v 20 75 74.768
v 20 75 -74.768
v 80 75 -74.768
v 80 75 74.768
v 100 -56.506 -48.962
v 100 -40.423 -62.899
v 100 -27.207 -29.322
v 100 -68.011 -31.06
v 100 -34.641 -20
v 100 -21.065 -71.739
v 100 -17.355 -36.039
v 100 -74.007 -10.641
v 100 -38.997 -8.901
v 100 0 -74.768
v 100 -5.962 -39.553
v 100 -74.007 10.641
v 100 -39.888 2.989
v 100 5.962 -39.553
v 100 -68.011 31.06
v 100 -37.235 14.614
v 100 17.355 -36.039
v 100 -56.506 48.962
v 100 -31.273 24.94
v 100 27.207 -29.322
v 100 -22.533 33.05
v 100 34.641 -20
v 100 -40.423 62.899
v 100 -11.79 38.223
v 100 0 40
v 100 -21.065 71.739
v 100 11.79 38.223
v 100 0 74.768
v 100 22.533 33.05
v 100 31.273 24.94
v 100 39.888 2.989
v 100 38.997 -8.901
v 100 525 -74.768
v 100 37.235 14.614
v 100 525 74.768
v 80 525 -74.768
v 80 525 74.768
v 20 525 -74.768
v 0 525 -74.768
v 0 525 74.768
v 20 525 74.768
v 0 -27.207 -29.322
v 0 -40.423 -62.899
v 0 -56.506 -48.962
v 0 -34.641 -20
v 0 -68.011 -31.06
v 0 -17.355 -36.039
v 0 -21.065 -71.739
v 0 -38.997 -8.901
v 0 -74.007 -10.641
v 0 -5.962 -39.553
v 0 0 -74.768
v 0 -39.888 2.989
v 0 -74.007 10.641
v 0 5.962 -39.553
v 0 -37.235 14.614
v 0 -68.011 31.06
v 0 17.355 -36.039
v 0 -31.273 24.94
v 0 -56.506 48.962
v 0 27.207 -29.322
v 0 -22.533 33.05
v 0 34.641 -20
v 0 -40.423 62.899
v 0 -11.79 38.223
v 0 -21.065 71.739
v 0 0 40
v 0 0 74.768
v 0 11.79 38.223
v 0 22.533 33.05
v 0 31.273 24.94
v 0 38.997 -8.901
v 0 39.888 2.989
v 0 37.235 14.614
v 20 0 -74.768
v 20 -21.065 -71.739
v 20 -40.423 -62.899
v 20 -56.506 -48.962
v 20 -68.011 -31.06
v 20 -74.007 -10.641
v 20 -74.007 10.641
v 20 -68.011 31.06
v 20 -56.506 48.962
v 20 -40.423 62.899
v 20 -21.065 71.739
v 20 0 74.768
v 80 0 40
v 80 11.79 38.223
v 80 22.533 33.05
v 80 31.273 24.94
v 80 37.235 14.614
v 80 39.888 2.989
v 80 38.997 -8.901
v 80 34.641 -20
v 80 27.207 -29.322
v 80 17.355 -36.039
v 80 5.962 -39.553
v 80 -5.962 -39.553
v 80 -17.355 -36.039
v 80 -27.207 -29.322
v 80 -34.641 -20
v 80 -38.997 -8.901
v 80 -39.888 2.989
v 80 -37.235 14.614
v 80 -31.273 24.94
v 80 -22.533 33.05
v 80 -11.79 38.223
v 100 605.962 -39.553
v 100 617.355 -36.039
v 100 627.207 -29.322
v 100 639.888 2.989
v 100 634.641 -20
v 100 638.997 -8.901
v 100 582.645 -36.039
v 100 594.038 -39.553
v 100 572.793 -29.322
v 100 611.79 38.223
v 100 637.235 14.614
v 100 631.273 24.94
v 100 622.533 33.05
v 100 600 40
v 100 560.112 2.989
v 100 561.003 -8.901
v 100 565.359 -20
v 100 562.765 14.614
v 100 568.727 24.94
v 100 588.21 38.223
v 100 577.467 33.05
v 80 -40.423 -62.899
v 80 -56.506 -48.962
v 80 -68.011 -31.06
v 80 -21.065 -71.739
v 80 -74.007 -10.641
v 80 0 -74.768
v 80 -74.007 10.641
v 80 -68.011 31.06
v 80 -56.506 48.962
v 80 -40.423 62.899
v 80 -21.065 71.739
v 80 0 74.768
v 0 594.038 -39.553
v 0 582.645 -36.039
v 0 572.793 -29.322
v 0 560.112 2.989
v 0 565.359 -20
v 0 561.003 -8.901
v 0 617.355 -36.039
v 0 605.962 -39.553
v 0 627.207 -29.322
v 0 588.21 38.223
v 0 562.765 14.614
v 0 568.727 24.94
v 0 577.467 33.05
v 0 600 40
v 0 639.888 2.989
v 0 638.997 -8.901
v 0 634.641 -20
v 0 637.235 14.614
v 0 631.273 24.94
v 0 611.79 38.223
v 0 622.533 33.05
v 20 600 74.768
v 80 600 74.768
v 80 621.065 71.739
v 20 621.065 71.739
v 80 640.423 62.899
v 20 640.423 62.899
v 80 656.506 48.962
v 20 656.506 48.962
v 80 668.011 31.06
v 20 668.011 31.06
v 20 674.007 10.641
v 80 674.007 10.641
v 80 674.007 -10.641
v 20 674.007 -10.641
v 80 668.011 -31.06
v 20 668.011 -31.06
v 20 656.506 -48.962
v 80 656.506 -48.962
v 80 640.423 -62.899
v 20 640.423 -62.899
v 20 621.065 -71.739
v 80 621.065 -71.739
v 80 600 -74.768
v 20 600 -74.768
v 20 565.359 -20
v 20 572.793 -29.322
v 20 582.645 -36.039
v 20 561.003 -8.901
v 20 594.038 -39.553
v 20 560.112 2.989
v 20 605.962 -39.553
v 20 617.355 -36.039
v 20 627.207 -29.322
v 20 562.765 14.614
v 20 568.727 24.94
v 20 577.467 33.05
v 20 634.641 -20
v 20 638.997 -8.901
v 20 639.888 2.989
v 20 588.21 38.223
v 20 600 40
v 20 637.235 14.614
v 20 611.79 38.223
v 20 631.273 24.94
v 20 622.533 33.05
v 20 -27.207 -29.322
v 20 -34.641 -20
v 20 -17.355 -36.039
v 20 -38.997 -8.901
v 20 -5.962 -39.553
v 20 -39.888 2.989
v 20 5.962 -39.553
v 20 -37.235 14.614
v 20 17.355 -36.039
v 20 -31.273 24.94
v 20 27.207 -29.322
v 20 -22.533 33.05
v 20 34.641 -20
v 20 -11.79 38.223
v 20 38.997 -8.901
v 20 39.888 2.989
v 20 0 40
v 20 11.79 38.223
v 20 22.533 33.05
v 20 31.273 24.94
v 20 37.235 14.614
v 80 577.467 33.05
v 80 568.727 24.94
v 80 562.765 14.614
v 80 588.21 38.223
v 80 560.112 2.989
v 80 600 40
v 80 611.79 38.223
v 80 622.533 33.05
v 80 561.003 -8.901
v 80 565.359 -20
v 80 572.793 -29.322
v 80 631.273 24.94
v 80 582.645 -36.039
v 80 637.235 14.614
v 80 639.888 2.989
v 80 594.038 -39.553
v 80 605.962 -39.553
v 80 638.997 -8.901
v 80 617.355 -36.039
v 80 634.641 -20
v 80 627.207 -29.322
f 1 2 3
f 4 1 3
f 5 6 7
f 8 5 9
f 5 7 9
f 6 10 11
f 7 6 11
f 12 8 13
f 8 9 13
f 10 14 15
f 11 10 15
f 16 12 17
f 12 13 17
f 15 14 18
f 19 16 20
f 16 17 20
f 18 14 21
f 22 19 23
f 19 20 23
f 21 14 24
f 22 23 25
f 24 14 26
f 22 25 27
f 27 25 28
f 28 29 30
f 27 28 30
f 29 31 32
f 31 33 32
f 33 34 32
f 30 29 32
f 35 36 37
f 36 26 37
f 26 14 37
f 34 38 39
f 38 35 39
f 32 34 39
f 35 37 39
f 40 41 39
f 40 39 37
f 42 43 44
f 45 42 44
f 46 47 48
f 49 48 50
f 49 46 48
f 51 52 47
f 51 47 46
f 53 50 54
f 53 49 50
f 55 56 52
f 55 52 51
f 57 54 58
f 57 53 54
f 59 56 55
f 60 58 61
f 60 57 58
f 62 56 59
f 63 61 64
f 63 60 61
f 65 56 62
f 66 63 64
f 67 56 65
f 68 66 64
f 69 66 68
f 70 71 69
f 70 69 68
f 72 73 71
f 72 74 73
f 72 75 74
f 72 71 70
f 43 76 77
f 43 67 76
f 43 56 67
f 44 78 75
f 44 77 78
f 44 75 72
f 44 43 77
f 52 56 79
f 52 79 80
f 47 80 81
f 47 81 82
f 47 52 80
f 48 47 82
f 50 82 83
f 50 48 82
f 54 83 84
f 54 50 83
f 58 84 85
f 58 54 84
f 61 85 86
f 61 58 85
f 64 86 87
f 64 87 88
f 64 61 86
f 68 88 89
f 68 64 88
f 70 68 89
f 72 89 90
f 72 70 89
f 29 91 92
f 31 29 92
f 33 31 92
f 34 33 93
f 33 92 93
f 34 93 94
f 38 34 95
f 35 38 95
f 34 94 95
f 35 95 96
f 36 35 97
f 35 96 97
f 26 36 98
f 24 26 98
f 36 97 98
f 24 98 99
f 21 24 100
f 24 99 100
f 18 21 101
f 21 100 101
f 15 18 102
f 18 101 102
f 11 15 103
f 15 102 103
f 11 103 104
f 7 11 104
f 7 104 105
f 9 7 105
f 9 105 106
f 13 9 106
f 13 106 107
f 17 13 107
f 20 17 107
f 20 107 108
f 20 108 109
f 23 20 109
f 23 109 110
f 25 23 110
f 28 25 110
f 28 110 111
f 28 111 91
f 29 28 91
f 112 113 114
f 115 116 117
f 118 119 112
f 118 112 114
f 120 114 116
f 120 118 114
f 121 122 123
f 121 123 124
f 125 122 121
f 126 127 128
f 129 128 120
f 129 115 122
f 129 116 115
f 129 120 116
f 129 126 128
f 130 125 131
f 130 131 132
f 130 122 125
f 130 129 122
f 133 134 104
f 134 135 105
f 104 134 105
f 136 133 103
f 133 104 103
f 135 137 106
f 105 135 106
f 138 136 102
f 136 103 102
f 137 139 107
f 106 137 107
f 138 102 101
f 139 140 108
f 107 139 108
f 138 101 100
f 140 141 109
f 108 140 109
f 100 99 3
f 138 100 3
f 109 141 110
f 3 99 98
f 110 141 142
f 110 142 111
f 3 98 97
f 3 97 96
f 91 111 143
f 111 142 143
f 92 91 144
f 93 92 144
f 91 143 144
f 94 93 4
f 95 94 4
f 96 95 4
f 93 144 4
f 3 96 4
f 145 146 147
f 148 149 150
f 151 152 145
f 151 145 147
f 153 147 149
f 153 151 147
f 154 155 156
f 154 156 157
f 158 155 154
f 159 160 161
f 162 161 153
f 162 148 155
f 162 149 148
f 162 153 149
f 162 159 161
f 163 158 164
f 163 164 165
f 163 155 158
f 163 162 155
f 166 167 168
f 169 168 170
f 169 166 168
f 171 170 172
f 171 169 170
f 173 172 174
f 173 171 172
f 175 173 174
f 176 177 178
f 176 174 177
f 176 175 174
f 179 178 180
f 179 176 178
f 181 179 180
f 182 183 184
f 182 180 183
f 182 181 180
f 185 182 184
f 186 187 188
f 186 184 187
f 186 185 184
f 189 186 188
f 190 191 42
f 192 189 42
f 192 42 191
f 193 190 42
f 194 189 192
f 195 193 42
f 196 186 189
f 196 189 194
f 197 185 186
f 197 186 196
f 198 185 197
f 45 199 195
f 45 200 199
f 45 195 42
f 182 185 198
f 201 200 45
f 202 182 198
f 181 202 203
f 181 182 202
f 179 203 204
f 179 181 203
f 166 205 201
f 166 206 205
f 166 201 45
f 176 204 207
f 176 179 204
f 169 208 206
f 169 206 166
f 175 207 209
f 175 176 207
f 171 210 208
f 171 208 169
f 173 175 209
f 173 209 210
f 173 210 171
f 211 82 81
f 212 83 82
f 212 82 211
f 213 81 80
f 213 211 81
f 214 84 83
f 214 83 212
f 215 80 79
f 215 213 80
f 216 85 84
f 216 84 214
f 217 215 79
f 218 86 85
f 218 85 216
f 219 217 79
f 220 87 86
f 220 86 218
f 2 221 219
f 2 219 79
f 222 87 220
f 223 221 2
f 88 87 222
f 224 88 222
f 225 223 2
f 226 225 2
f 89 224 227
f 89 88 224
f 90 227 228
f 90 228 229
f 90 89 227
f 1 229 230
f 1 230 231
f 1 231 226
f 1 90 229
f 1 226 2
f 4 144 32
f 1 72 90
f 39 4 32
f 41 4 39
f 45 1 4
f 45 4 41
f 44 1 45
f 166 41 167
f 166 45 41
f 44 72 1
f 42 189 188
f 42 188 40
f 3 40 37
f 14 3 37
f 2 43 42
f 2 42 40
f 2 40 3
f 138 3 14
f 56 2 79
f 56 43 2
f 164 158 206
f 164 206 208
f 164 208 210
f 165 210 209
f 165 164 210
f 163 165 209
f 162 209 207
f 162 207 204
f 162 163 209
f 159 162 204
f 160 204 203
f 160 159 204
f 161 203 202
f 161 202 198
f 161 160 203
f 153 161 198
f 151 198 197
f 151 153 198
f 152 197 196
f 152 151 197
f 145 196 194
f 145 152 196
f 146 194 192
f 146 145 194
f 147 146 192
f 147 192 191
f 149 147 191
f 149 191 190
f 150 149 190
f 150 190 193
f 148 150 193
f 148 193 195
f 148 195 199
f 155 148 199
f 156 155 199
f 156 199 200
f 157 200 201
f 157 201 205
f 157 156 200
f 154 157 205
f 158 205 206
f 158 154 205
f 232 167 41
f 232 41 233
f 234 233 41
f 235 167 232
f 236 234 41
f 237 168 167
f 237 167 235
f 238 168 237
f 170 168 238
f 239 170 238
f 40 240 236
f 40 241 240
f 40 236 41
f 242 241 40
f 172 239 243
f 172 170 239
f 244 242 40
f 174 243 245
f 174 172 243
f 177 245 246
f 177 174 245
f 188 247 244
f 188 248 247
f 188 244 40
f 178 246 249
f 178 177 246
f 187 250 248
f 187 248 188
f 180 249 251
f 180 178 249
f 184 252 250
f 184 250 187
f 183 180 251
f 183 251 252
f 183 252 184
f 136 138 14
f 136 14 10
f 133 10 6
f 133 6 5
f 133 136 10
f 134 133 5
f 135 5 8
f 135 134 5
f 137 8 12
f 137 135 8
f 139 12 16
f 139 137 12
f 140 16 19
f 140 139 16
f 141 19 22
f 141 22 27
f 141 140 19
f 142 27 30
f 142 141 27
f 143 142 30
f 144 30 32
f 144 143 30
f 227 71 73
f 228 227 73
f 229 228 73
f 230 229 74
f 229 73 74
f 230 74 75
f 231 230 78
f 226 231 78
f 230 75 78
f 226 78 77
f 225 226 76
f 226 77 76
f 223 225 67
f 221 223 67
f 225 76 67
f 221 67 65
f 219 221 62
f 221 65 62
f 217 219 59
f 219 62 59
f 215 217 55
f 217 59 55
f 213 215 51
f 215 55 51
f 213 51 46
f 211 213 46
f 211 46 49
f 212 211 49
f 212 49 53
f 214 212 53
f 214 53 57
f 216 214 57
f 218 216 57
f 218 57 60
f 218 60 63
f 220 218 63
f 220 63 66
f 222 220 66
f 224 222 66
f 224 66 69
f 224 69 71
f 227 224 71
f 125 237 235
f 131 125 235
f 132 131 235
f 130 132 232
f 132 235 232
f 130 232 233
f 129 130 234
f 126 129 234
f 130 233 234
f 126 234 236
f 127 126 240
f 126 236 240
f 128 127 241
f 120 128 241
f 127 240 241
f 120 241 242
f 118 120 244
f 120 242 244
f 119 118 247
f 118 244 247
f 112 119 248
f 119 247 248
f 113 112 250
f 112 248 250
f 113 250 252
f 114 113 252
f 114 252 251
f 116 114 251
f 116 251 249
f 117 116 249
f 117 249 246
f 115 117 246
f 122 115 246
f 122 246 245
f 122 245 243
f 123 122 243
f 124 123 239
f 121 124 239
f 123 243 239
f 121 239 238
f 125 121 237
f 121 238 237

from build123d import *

# Parameters (mm, degrees)
BOSS_EXTRUDE1_DEPTH = 100
CUT_EXTRUDE2_DEPTH  = 20
CUT_EXTRUDE3_START  = -20
CUT_EXTRUDE3_DEPTH  = 20
SKETCH10_R          = 40
BOSS_EXTRUDE6_DEPTH = 20
BOSS_EXTRUDE7_START = 20
SKETCH11_R          = 40
BOSS_EXTRUDE7_DEPTH = 20
SKETCH19_R          = 40
CUT_EXTRUDE7_DEPTH  = 285
SKETCH16_W          = 60
SKETCH16_H          = 150
CUT_EXTRUDE8_DEPTH  = 285


with BuildPart() as part:
    # Sketch1 → Boss-Extrude1 (new body)
    with BuildSketch(Plane(origin=(0, 0, 0), x_dir=(0, 0, -1), z_dir=(1, 0, 0))):
        with BuildLine():
            Line((-74.767803634, 0), (-74.767803634, 600))
            ThreePointArc((-74.767803634, 600), (0, 674.767803634), (74.767803634, 600))
            Line((74.767803634, 600), (74.767803634, 0))
            ThreePointArc((74.767803634, 0), (0, -74.767803634), (-74.767803634, 0))
        make_face()
    extrude(amount=BOSS_EXTRUDE1_DEPTH)

    # Sketch8 → Cut-Extrude2 (cut)
    with BuildSketch(Plane.ZY):
        with BuildLine():
            Line((-74.767803634, 600), (-74.767803634, 525))
            Line((-74.767803634, 525), (74.767803634, 525))
            Line((74.767803634, 525), (74.767803634, 600))
            ThreePointArc((74.767803634, 600), (0, 674.767803634), (-74.767803634, 600))
        make_face()
    extrude(amount=-CUT_EXTRUDE2_DEPTH, mode=Mode.SUBTRACT)

    # Sketch7 → Cut-Extrude3 (cut)
    with BuildSketch(Plane(origin=(100, 0, 0), x_dir=(0, 0, -1), z_dir=(1, 0, 0)).offset(CUT_EXTRUDE3_START)):
        with BuildLine():
            Line((-74.767803634, 600), (-74.767803634, 525))
            Line((-74.767803634, 525), (74.767803634, 525))
            Line((74.767803634, 525), (74.767803634, 600))
            ThreePointArc((74.767803634, 600), (0, 674.767803634), (-74.767803634, 600))
        make_face()
    extrude(amount=CUT_EXTRUDE3_DEPTH, mode=Mode.SUBTRACT)

    # Sketch10 → Boss-Extrude6 (add)
    with BuildSketch(Plane(origin=(80, 0, 0), x_dir=(0, 0, -1), z_dir=(1, 0, 0))):
        with Locations(Location((0, 600, 0), (0, 0, 180))):
            Circle(SKETCH10_R)
    extrude(amount=BOSS_EXTRUDE6_DEPTH)

    # Sketch11 → Boss-Extrude7 (add)
    with BuildSketch(Plane.ZY.offset(-20).offset(BOSS_EXTRUDE7_START)):
        with Locations((0, 600)):
            Circle(SKETCH11_R)
    extrude(amount=-BOSS_EXTRUDE7_DEPTH)

    # Sketch19 → Cut-Extrude7 (cut)
    with BuildSketch(Plane.ZY):
        Circle(SKETCH19_R)
    extrude(amount=-CUT_EXTRUDE7_DEPTH, mode=Mode.SUBTRACT)

    # Sketch16 → Cut-Extrude8 (cut)
    with BuildSketch(Plane.XY.offset(74.767803634)):
        with Locations((50, 0)):
            Rectangle(SKETCH16_W, SKETCH16_H)
    extrude(amount=-CUT_EXTRUDE8_DEPTH, mode=Mode.SUBTRACT)


solid = part.part
